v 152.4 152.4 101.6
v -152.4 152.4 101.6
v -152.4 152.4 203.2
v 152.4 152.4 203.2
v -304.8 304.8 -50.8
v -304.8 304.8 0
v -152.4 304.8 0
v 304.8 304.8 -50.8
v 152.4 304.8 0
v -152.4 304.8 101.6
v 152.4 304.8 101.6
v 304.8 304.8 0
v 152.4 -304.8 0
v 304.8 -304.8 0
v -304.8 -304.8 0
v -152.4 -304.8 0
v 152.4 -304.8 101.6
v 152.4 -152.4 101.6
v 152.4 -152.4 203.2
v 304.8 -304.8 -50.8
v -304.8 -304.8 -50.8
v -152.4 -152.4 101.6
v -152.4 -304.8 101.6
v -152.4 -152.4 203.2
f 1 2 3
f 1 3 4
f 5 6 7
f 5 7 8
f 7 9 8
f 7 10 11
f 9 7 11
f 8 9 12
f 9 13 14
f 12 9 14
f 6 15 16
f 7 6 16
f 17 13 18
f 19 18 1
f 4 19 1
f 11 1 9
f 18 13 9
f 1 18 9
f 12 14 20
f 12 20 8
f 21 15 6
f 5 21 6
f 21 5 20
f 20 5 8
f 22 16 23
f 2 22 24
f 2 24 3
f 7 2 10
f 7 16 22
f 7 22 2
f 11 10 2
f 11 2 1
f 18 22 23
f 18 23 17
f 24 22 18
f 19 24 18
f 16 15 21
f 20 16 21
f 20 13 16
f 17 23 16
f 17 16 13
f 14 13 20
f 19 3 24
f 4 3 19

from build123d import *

# Parameters (mm, degrees)
F0_W     = 304.8
F0_H     = 609.6
F1_DEPTH = 101.6
F2_W     = 609.6
F2_H     = 609.6
F3_DEPTH = 50.8
F4_W     = 304.8
F4_H     = 304.8
F5_DEPTH = 101.6


with BuildPart() as f1:
    # F0 (on Top) → F1 (new body)
    with BuildSketch(Plane.XY):
        Rectangle(F0_W, F0_H)
    extrude(amount=F1_DEPTH)

    # F2 (on Top) → F3 (join)
    with BuildSketch(Plane.XY):
        Rectangle(F2_W, F2_H)
    extrude(amount=-F3_DEPTH)

    # F4 (on face) → F5 (join)
    with BuildSketch(Plane.XY.offset(101.6)):
        Rectangle(F4_W, F4_H)
    extrude(amount=F5_DEPTH)


solid = f1.part
